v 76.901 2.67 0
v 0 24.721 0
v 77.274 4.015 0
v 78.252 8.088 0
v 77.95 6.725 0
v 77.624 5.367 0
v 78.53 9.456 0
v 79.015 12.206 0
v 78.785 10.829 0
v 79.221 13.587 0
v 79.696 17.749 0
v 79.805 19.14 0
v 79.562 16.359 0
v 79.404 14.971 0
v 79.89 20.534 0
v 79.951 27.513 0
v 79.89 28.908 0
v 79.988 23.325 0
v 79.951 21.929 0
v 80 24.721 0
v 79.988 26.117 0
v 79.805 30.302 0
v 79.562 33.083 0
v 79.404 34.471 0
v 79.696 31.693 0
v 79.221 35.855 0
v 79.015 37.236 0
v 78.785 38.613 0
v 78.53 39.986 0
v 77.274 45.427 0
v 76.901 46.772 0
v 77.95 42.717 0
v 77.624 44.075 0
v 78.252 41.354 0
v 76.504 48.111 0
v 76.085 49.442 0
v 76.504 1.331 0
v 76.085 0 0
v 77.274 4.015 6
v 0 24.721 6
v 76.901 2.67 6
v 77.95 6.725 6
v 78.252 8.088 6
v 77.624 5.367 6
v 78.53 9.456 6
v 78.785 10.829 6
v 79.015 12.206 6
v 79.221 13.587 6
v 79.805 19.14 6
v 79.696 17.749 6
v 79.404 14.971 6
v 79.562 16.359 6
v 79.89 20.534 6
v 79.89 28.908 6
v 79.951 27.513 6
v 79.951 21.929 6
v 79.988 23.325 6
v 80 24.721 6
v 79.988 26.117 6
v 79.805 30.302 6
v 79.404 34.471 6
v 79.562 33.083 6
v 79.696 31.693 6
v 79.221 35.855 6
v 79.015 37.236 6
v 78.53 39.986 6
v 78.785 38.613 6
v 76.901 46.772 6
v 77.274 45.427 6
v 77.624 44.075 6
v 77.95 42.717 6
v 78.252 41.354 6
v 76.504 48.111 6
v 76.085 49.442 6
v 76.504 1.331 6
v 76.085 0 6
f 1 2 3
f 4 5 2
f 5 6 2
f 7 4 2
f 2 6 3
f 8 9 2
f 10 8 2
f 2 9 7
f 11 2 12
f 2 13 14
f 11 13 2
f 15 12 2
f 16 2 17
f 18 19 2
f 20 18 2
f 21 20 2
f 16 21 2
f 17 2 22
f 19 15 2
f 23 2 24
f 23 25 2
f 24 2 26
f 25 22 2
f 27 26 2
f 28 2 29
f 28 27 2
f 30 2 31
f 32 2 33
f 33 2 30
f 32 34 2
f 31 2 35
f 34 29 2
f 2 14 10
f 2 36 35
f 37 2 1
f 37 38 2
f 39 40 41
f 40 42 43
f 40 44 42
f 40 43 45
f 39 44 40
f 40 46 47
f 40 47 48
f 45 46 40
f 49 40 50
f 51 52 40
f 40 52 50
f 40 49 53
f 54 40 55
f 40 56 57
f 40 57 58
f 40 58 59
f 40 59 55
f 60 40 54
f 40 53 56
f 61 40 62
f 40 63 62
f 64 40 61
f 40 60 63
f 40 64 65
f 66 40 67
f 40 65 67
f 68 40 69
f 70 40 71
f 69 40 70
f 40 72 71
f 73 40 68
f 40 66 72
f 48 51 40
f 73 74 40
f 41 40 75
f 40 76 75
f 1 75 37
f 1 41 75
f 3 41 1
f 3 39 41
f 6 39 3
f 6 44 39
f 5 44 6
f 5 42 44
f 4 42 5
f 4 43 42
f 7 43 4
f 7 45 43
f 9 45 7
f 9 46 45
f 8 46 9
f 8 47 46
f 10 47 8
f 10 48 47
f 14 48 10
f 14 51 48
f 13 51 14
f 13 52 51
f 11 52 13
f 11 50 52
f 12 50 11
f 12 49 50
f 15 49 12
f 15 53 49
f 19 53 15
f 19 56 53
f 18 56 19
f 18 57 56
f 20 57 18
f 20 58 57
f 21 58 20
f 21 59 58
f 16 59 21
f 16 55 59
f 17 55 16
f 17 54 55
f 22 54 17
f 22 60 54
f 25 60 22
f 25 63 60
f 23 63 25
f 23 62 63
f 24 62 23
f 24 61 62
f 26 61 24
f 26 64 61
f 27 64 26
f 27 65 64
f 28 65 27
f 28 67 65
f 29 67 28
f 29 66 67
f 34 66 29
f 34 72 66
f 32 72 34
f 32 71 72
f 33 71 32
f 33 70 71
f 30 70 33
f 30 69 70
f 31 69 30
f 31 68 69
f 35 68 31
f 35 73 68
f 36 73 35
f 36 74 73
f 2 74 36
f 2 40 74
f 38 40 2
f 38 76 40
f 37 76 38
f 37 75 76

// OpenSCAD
$fn = 32;

// ----------------------------------------------------------------------
// Arc profile plate: sector, 38 points
// ----------------------------------------------------------------------

// --- parameters (mm) ---
sector_angle = 36;        // sector angle, degrees
sector_r = 80;            // outer radius
arc_step = 1;             // sampling step of the arc, degrees
plate_t = 6;              // plate thickness, Z
fit_tol = 0.1;            // declared fit tolerance (prompt contract)
free_tol = 0.5;           // declared free tolerance (prompt contract)

bbox_x = 2 * sector_r * sin(sector_angle / 2);  // chord of the sector
bbox_y = sector_r;  // depth of the sector (apex to arc)

profile = [[76.085, 0], [76.504, 1.331], [76.901, 2.67], [77.274, 4.015], [77.624, 5.367], [77.95, 6.725], [78.252, 8.088], [78.53, 9.456], [78.785, 10.829], [79.015, 12.206], [79.221, 13.587], [79.404, 14.971], [79.562, 16.359], [79.696, 17.749], [79.805, 19.14], [79.89, 20.534], [79.951, 21.929], [79.988, 23.325], [80, 24.721], [79.988, 26.117], [79.951, 27.513], [79.89, 28.908], [79.805, 30.302], [79.696, 31.693], [79.562, 33.083], [79.404, 34.471], [79.221, 35.855], [79.015, 37.236], [78.785, 38.613], [78.53, 39.986], [78.252, 41.354], [77.95, 42.717], [77.624, 44.075], [77.274, 45.427], [76.901, 46.772], [76.504, 48.111], [76.085, 49.442], [0, 24.721]];  // primary outline, 38 points, counter clockwise

// --- the one profile operation ---
linear_extrude(height = plate_t) polygon(points = profile);
